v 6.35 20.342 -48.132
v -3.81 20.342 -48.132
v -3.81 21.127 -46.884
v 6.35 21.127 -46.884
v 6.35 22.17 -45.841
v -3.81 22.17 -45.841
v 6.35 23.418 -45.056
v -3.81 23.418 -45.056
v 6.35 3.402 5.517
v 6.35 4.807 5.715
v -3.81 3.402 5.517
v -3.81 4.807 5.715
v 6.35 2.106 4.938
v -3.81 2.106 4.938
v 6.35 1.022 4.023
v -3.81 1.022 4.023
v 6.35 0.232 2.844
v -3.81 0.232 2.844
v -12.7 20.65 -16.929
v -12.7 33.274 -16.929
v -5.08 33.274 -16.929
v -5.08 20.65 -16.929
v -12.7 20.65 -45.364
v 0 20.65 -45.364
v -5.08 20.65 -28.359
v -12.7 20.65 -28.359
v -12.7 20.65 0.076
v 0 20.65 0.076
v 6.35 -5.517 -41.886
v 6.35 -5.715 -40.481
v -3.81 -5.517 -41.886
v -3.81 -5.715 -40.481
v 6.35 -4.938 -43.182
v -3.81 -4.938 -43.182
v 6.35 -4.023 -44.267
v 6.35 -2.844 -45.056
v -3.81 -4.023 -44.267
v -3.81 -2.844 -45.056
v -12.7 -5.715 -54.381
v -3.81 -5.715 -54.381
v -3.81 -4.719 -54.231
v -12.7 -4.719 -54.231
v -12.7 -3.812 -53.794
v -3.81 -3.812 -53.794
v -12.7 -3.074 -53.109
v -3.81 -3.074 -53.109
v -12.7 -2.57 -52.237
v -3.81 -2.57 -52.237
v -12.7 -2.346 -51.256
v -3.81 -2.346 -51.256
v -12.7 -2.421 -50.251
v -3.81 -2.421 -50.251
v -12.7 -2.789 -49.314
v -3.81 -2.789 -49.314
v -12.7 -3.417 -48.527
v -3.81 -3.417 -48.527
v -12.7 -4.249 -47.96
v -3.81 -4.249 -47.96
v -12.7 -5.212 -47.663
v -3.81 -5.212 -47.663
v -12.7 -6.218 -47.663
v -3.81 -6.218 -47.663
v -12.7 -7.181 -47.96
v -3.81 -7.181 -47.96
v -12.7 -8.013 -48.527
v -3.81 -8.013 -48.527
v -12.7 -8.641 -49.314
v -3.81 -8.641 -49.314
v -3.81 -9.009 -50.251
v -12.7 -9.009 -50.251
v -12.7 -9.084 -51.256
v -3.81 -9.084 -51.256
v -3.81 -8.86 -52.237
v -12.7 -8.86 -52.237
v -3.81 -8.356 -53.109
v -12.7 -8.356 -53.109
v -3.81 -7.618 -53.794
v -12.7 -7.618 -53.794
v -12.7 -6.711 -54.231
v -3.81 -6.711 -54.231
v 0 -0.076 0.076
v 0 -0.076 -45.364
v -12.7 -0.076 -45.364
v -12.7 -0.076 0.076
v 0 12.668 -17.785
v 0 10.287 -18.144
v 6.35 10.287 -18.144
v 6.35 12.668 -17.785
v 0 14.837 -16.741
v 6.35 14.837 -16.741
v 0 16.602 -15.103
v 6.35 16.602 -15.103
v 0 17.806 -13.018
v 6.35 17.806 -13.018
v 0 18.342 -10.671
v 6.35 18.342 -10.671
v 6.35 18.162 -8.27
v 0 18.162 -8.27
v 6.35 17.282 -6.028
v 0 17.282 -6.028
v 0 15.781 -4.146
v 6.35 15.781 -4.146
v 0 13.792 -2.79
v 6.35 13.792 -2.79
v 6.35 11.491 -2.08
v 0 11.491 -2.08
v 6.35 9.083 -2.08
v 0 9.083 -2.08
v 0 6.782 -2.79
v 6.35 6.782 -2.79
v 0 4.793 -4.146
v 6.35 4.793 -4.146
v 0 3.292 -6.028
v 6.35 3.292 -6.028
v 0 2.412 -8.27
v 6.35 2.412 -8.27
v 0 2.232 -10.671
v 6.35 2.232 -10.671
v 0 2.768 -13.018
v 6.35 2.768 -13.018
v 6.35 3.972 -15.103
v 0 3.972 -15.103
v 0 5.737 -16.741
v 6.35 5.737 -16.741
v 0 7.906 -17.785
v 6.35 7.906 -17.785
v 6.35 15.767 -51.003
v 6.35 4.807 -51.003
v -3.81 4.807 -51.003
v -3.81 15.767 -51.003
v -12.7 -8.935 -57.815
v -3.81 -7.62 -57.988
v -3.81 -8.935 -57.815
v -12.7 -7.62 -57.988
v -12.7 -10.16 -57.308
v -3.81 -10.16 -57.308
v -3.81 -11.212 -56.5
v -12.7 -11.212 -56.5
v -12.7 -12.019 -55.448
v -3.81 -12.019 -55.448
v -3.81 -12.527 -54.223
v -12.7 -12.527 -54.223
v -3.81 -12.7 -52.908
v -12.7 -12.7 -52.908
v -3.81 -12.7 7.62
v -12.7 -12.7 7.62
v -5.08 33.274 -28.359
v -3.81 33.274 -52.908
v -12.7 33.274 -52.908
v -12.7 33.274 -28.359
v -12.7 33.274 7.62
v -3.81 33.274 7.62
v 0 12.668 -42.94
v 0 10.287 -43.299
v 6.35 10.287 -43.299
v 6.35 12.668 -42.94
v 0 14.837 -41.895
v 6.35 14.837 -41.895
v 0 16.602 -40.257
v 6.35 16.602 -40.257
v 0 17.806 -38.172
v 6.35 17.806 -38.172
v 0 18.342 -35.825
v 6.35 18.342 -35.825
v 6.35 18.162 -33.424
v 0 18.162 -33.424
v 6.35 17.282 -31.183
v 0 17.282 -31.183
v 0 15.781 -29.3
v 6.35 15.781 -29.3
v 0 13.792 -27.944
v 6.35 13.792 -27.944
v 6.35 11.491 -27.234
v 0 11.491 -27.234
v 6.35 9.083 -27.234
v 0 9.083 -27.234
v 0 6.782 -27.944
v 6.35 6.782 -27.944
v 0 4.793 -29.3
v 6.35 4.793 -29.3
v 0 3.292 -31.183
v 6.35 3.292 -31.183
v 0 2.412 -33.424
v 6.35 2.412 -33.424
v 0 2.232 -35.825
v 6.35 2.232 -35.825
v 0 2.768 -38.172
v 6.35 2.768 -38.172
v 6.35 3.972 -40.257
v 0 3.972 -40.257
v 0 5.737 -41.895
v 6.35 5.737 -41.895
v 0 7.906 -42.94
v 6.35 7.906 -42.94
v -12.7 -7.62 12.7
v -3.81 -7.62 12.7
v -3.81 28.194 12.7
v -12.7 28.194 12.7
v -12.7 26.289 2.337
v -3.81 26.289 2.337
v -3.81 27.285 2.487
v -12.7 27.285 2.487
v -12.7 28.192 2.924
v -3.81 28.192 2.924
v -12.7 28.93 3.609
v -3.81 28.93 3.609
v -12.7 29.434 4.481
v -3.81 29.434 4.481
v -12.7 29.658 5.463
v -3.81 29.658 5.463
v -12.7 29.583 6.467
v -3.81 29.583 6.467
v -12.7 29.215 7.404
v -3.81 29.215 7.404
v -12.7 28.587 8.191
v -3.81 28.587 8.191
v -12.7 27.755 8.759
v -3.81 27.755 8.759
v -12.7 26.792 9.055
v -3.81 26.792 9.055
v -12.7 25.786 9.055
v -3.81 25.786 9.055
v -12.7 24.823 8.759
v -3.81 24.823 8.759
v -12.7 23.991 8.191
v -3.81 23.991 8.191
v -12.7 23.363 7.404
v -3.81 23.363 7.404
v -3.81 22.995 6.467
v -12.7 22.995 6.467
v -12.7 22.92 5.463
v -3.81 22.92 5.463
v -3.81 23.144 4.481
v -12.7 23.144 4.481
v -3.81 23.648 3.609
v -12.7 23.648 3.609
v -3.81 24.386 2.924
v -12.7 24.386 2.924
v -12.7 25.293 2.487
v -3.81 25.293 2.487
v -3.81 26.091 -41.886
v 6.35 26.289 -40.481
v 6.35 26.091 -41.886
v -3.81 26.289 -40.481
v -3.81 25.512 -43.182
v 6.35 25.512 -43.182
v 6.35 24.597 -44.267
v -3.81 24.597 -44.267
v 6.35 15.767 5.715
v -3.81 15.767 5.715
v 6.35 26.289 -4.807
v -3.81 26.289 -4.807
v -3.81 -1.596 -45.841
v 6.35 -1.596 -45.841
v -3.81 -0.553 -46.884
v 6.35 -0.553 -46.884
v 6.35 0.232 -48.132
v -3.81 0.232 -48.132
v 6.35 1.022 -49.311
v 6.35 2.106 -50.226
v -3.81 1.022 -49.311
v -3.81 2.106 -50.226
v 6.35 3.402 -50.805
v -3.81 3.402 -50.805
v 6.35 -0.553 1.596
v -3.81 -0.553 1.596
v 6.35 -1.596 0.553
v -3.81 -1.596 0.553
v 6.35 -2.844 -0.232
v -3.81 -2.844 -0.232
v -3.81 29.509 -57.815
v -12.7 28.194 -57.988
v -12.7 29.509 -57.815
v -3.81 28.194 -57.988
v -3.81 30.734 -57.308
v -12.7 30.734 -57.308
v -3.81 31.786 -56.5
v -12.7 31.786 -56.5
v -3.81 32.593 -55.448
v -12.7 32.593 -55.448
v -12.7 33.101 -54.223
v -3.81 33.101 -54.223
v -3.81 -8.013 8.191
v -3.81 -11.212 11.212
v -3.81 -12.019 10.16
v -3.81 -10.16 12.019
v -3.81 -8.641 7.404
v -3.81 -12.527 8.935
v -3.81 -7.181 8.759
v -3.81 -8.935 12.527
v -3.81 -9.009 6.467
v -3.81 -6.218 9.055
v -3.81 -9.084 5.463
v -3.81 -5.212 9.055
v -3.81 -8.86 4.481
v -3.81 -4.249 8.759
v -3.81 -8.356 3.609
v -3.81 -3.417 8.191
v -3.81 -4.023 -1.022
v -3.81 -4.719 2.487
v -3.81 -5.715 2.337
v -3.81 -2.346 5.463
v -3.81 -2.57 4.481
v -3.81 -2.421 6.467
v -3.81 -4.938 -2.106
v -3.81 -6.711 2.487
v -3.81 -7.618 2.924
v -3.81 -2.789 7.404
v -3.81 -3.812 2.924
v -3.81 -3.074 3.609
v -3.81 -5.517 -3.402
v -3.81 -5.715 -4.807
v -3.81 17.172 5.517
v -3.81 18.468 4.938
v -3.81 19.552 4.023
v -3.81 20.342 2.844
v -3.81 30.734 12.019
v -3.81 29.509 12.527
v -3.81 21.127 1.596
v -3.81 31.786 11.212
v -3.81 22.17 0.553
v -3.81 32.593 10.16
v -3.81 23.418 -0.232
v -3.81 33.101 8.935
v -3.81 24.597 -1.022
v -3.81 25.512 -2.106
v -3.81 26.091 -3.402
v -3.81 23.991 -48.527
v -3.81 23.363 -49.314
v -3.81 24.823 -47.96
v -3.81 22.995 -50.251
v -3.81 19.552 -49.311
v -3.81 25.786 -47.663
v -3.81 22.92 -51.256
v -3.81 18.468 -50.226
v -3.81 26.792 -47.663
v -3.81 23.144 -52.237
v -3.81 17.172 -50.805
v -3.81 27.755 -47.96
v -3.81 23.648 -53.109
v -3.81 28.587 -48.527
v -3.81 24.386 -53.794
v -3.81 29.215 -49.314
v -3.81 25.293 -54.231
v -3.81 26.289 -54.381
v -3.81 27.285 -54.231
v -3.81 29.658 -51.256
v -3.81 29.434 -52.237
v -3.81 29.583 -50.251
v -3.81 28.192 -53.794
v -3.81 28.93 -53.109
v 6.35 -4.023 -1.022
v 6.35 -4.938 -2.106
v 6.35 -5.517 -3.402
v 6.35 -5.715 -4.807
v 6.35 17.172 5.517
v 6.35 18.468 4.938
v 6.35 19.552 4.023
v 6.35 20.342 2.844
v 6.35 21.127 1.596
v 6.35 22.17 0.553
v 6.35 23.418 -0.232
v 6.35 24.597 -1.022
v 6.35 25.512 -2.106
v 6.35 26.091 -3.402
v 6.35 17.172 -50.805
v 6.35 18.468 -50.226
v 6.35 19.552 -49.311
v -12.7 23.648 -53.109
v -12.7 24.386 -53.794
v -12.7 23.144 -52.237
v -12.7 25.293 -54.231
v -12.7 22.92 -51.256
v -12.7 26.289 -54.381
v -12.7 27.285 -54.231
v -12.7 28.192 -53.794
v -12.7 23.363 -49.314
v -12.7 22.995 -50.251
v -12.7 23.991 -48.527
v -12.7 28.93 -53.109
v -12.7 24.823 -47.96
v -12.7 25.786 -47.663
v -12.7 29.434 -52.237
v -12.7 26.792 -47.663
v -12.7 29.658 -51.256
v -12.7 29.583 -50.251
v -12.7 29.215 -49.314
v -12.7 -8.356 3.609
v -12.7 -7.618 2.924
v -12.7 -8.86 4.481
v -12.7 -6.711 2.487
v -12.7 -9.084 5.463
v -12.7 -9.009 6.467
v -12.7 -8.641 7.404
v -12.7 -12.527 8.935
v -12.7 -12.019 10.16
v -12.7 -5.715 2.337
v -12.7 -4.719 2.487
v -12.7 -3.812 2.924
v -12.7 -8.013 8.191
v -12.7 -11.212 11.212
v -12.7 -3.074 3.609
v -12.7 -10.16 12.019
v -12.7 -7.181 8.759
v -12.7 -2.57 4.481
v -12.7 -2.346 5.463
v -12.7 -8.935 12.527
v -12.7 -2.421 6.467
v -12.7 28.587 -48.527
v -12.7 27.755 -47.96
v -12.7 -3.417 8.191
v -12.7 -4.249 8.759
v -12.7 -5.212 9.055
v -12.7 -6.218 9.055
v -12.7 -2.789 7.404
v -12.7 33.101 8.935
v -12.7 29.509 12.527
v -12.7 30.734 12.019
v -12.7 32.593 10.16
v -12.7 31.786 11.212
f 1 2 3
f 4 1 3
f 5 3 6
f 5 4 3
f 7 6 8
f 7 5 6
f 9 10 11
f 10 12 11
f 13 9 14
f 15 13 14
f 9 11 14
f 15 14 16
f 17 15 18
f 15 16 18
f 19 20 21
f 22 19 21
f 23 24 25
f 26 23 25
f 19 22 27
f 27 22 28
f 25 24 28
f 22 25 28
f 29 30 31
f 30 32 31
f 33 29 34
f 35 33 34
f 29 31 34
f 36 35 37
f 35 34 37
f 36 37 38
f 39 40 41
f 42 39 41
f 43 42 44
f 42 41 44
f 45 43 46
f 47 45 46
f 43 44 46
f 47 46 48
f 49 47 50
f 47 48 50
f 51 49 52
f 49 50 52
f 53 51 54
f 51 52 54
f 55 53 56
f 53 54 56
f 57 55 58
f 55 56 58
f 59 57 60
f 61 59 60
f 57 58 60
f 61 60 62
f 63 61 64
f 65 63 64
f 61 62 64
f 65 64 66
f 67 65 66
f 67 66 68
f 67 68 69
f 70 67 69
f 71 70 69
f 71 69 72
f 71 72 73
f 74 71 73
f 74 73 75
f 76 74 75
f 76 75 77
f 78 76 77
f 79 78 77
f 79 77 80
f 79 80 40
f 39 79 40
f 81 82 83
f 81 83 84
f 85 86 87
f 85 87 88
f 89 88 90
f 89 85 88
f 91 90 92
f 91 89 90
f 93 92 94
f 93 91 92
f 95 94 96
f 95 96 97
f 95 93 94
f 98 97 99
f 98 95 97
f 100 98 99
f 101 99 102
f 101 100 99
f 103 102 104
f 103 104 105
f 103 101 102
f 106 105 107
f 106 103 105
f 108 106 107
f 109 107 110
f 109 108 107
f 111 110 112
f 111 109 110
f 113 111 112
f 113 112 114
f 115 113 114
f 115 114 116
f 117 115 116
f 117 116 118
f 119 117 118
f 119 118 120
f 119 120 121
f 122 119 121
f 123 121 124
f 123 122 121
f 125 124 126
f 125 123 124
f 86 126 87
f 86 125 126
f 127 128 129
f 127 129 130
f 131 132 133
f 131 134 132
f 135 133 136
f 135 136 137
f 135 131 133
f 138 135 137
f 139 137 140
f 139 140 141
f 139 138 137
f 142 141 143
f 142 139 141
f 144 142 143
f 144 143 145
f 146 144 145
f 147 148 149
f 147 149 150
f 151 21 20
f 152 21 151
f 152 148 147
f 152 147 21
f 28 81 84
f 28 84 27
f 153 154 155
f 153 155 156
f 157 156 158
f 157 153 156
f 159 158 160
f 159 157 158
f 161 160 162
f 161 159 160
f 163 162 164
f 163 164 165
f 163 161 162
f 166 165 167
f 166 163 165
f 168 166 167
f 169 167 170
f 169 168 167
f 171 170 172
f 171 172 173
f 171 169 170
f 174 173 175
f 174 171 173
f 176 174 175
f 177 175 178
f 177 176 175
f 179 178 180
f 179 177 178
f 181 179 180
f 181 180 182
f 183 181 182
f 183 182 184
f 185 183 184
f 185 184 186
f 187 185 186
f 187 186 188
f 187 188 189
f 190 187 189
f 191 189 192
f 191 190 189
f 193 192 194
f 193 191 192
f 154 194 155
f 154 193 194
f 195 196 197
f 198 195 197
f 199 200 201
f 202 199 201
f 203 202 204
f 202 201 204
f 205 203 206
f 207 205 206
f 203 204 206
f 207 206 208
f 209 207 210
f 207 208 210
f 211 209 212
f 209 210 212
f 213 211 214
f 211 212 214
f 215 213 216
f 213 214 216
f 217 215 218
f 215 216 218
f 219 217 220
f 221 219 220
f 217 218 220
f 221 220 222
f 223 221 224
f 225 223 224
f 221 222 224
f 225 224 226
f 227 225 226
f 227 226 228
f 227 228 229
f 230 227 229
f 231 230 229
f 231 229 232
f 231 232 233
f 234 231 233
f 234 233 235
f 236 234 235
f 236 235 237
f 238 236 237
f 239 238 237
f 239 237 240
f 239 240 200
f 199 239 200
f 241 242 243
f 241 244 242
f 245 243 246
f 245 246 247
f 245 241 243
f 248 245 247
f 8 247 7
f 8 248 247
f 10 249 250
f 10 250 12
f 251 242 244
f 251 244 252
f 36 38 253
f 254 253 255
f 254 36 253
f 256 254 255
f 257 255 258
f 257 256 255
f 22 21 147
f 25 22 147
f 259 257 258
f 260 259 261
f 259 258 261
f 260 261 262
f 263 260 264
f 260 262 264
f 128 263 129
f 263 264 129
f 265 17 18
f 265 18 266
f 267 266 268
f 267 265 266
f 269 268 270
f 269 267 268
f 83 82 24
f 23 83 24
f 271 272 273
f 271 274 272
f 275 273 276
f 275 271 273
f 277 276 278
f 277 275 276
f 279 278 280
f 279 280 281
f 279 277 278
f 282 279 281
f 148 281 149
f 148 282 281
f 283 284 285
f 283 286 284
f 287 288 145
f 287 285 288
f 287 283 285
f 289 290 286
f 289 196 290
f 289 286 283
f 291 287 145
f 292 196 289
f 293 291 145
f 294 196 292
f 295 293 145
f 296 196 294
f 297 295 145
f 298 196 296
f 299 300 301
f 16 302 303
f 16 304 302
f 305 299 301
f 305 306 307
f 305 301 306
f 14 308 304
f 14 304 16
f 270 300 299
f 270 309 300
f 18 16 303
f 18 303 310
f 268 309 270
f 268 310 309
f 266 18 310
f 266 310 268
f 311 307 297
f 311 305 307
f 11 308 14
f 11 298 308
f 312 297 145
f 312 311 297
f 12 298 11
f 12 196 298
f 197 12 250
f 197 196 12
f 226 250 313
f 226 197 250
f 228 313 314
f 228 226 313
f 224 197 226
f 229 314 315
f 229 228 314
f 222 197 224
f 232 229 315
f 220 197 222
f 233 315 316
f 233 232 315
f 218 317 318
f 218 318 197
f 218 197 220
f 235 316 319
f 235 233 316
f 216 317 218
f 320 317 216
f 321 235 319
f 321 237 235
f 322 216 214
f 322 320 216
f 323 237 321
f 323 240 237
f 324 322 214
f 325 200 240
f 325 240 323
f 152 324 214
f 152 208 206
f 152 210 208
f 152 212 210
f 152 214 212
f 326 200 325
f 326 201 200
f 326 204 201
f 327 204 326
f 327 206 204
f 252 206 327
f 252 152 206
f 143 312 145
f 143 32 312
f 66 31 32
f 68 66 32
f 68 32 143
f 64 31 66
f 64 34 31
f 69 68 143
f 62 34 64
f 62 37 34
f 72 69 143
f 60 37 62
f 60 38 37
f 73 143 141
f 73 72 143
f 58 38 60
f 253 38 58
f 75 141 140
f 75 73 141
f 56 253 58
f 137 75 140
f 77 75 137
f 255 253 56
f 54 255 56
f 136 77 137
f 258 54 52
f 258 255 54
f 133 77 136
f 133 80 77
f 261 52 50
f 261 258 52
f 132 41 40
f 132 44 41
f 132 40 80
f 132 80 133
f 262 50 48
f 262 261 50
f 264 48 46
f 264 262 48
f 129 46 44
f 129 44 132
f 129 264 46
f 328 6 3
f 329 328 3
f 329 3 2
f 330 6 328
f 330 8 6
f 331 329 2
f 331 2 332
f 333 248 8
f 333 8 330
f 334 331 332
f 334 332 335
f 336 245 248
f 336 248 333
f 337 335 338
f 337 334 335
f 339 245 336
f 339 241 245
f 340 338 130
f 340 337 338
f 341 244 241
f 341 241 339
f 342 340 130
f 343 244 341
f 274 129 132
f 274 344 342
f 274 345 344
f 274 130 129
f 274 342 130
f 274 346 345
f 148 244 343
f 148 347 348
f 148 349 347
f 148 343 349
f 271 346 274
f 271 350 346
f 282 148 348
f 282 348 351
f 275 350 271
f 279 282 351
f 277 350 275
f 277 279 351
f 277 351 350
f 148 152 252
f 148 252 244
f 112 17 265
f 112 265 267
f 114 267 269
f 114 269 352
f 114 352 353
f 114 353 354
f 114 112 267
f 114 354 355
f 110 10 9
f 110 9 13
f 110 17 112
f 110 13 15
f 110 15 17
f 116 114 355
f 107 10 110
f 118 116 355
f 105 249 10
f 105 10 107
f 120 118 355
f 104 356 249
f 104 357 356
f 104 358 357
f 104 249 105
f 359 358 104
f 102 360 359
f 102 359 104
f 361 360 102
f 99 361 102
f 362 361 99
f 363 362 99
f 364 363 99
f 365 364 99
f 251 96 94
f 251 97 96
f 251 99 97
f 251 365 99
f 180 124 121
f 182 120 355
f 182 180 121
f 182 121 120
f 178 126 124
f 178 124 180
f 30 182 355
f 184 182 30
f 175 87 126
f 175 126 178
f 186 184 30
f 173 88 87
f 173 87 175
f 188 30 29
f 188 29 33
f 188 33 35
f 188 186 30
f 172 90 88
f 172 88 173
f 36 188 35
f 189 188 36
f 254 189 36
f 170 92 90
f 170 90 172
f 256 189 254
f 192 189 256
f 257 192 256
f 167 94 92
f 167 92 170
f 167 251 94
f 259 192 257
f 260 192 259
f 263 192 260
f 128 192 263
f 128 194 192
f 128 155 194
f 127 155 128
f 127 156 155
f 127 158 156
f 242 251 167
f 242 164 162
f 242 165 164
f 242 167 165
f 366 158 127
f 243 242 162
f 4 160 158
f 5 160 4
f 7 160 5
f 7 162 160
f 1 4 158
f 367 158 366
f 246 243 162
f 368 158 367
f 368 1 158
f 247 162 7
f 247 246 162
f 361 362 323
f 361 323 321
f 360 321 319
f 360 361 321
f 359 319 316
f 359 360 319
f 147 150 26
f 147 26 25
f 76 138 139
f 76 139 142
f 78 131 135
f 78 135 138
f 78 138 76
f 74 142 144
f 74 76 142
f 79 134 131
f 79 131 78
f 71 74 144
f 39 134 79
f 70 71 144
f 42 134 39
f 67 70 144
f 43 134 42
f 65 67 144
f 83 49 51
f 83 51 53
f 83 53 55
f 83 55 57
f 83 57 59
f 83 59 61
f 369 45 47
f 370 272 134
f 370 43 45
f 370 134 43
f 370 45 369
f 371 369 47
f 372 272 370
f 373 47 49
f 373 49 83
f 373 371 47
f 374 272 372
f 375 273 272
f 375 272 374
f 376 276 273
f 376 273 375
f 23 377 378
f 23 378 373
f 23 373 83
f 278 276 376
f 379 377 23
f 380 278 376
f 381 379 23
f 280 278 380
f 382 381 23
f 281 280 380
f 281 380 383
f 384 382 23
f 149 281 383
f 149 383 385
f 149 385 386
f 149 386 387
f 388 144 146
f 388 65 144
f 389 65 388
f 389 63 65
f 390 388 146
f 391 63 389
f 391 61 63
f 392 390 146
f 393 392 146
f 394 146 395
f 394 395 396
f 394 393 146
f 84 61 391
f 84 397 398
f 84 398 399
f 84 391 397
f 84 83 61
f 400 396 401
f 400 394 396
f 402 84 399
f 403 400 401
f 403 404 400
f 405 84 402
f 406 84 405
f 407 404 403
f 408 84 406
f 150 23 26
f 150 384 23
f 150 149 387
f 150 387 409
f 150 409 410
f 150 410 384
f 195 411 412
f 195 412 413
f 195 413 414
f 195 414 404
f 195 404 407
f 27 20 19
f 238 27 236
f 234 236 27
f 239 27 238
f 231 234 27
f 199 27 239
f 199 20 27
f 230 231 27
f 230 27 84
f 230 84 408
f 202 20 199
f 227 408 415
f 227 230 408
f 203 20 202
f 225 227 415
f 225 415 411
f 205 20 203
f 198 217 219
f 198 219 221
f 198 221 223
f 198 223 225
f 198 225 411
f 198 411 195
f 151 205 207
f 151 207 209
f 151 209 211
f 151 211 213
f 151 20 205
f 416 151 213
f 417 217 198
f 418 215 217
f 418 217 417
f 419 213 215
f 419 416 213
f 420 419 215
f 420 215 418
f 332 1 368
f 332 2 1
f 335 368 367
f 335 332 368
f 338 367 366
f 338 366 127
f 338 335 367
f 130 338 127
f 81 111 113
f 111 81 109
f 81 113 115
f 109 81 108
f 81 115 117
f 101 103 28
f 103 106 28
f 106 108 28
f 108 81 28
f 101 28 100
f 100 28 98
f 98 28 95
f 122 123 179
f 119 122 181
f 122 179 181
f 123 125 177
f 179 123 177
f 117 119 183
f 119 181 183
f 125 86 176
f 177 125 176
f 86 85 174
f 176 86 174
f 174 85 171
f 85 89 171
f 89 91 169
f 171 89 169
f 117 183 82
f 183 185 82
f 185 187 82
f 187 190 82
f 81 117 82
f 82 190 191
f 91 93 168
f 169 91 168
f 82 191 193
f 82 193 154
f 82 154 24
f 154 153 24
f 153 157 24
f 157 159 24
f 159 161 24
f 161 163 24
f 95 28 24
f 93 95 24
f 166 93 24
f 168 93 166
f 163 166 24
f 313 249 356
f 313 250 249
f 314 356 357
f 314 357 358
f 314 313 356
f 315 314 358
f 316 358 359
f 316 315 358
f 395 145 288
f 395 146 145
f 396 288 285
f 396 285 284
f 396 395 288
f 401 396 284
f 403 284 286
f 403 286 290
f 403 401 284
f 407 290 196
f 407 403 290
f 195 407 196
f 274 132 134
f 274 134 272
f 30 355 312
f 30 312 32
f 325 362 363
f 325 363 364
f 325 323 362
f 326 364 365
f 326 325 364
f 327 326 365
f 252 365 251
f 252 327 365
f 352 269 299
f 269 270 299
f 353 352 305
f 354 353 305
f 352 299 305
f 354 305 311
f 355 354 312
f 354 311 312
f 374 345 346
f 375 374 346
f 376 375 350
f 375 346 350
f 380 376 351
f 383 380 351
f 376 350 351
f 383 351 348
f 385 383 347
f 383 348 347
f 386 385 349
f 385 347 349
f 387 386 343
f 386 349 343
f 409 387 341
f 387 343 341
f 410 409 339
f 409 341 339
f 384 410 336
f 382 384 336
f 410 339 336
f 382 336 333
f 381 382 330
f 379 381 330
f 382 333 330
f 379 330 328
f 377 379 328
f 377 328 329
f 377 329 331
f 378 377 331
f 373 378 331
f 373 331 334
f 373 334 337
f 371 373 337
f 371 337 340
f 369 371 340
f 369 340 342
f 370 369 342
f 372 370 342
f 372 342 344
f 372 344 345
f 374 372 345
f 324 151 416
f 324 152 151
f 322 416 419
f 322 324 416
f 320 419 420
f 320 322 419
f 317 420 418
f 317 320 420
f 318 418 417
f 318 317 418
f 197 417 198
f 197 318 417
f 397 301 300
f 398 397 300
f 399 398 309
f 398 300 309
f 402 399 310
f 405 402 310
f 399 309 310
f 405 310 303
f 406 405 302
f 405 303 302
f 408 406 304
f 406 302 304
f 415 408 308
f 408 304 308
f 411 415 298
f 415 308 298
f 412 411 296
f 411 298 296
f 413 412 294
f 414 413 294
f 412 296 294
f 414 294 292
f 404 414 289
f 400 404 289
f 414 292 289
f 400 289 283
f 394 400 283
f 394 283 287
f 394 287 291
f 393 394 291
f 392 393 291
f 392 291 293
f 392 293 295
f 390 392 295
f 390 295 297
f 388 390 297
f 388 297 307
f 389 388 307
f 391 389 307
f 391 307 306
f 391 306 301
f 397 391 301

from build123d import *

# Parameters (mm, degrees)
SKETCH1_W           = 70.6882
SKETCH1_H           = 45.974
SKETCH1_R           = 8.0772
BOSS_EXTRUDE1_DEPTH = 6.35
SKETCH2_W           = 70.6882
SKETCH2_H           = 45.974
SKETCH2_W_2         = 45.4406
SKETCH2_H_2         = 20.7264
BOSS_EXTRUDE2_DEPTH = 12.7
SKETCH3_W           = 7.62
SKETCH3_H           = 11.43
CUT_EXTRUDE1_DEPTH  = 12.6238
SKETCH4_W           = 70.6882
SKETCH4_H           = 45.974
SKETCH4_R           = 3.3782
CUT_EXTRUDE2_DEPTH  = 10.16
SKETCH4_3_R         = 3.3782
CUT_EXTRUDE3_DEPTH  = 70.517572708
FILLET1_R           = 5.08


with BuildPart() as part:
    # Sketch1 → Boss-Extrude1 (new body)
    with BuildSketch(Plane(origin=(0, 0, 0), x_dir=(0, 0, -1), z_dir=(1, 0, 0))):
        with Locations((22.6441, 10.287)):
            Rectangle(SKETCH1_W, SKETCH1_H)
        with Locations((35.221300017, 10.287)):
            Circle(SKETCH1_R, mode=Mode.SUBTRACT)
        with Locations((10.066899983, 10.287)):
            Circle(SKETCH1_R, mode=Mode.SUBTRACT)
    extrude(amount=BOSS_EXTRUDE1_DEPTH)

    # Sketch2 → Boss-Extrude2 (add)
    with BuildSketch(Plane.ZY):
        with Locations((-22.6441, 10.287)):
            Rectangle(SKETCH2_W, SKETCH2_H)
        with Locations((-22.6441, 10.287)):
            Rectangle(SKETCH2_W_2, SKETCH2_H_2, mode=Mode.SUBTRACT)
    extrude(amount=BOSS_EXTRUDE2_DEPTH)

    # Sketch3 → Cut-Extrude1 (cut)
    with BuildSketch(Plane(origin=(0, 33.274, 0), x_dir=(1, 0, 0), z_dir=(0, 1, 0))):
        with Locations((-8.89, 22.6441)):
            Rectangle(SKETCH3_W, SKETCH3_H)
    extrude(amount=-CUT_EXTRUDE1_DEPTH, mode=Mode.SUBTRACT)

    # Sketch4 → Cut-Extrude2 (cut)
    # profile 1 of 5: a face of its own
    with BuildSketch(Plane(origin=(6.35, 0, 0), x_dir=(0, 0, -1), z_dir=(1, 0, 0))):
        with Locations((22.6441, 10.287)):
            Rectangle(SKETCH4_W, SKETCH4_H)
        with Locations((-5.715, 26.289)):
            Circle(SKETCH4_R, mode=Mode.SUBTRACT)
        with Locations((-5.715, -5.715)):
            Circle(SKETCH4_R, mode=Mode.SUBTRACT)
        with Locations((51.0032, -5.715)):
            Circle(SKETCH4_R, mode=Mode.SUBTRACT)
        with Locations((51.0032, 26.289)):
            Circle(SKETCH4_R, mode=Mode.SUBTRACT)
        with BuildLine():
            Line((-5.715, 19.685), (-5.715, 0.889))
            ThreePointArc((-5.715, 0.889), (-1.045266817, -1.045266817), (0.889, -5.715))
            Line((0.889, -5.715), (44.3992, -5.715))
            ThreePointArc((44.3992, -5.715), (46.333466817, -1.045266817), (51.0032, 0.889))
            Line((51.0032, 0.889), (51.0032, 19.685))
            ThreePointArc((51.0032, 19.685), (46.333466817, 21.619266817), (44.3992, 26.289))
            Line((44.3992, 26.289), (0.889, 26.289))
            ThreePointArc((0.889, 26.289), (-1.045266817, 21.619266817), (-5.715, 19.685))
        make_face(mode=Mode.SUBTRACT)
    # profile 2 of 5: a face of its own
    with BuildSketch(Plane(origin=(6.35, 0, 0), x_dir=(0, 0, -1), z_dir=(1, 0, 0))):
        with Locations((-5.715, -5.715)):
            Circle(SKETCH4_R)
    # profile 3 of 5: a face of its own
    with BuildSketch(Plane(origin=(6.35, 0, 0), x_dir=(0, 0, -1), z_dir=(1, 0, 0))):
        with Locations((-5.715, 26.289)):
            Circle(SKETCH4_R)
    # profile 4 of 5: a face of its own
    with BuildSketch(Plane(origin=(6.35, 0, 0), x_dir=(0, 0, -1), z_dir=(1, 0, 0))):
        with Locations((51.0032, 26.289)):
            Circle(SKETCH4_R)
    # profile 5 of 5: a face of its own
    with BuildSketch(Plane(origin=(6.35, 0, 0), x_dir=(0, 0, -1), z_dir=(1, 0, 0))):
        with Locations((51.0032, -5.715)):
            Circle(SKETCH4_R)
    extrude(amount=-CUT_EXTRUDE2_DEPTH, mode=Mode.SUBTRACT)

    # Sketch4<3> → Cut-Extrude3 (cut, through all)
    with BuildSketch(Plane(origin=(6.35, 0, 0), x_dir=(0, 0, -1), z_dir=(1, 0, 0))):
        with Locations((-5.715, -5.715)):
            Circle(SKETCH4_3_R)
        with Locations((-5.715, 26.289)):
            Circle(SKETCH4_3_R)
        with Locations((51.0032, 26.289)):
            Circle(SKETCH4_3_R)
        with Locations((51.0032, -5.715)):
            Circle(SKETCH4_3_R)
    extrude(amount=-CUT_EXTRUDE3_DEPTH, mode=Mode.SUBTRACT)

    # Fillet1
    fillet1_edges = [part.edges().sort_by_distance(p)[0] for p in [
        (-8.255, 33.274, 12.7),
        (-8.255, 33.274, -57.9882),
        (-8.255, -12.7, -57.9882),
        (-8.255, -12.7, 12.7),
        (1.27, 19.685, 5.715),
        (1.27, 0.889, 5.715),
        (1.27, -5.715, -0.889),
        (1.27, -5.715, -44.3992),
        (1.27, 0.889, -51.0032),
        (1.27, 19.685, -51.0032),
        (1.27, 26.289, -44.3992),
        (1.27, 26.289, -0.889),
    ]]
    fillet(fillet1_edges, radius=FILLET1_R)


solid = part.part
